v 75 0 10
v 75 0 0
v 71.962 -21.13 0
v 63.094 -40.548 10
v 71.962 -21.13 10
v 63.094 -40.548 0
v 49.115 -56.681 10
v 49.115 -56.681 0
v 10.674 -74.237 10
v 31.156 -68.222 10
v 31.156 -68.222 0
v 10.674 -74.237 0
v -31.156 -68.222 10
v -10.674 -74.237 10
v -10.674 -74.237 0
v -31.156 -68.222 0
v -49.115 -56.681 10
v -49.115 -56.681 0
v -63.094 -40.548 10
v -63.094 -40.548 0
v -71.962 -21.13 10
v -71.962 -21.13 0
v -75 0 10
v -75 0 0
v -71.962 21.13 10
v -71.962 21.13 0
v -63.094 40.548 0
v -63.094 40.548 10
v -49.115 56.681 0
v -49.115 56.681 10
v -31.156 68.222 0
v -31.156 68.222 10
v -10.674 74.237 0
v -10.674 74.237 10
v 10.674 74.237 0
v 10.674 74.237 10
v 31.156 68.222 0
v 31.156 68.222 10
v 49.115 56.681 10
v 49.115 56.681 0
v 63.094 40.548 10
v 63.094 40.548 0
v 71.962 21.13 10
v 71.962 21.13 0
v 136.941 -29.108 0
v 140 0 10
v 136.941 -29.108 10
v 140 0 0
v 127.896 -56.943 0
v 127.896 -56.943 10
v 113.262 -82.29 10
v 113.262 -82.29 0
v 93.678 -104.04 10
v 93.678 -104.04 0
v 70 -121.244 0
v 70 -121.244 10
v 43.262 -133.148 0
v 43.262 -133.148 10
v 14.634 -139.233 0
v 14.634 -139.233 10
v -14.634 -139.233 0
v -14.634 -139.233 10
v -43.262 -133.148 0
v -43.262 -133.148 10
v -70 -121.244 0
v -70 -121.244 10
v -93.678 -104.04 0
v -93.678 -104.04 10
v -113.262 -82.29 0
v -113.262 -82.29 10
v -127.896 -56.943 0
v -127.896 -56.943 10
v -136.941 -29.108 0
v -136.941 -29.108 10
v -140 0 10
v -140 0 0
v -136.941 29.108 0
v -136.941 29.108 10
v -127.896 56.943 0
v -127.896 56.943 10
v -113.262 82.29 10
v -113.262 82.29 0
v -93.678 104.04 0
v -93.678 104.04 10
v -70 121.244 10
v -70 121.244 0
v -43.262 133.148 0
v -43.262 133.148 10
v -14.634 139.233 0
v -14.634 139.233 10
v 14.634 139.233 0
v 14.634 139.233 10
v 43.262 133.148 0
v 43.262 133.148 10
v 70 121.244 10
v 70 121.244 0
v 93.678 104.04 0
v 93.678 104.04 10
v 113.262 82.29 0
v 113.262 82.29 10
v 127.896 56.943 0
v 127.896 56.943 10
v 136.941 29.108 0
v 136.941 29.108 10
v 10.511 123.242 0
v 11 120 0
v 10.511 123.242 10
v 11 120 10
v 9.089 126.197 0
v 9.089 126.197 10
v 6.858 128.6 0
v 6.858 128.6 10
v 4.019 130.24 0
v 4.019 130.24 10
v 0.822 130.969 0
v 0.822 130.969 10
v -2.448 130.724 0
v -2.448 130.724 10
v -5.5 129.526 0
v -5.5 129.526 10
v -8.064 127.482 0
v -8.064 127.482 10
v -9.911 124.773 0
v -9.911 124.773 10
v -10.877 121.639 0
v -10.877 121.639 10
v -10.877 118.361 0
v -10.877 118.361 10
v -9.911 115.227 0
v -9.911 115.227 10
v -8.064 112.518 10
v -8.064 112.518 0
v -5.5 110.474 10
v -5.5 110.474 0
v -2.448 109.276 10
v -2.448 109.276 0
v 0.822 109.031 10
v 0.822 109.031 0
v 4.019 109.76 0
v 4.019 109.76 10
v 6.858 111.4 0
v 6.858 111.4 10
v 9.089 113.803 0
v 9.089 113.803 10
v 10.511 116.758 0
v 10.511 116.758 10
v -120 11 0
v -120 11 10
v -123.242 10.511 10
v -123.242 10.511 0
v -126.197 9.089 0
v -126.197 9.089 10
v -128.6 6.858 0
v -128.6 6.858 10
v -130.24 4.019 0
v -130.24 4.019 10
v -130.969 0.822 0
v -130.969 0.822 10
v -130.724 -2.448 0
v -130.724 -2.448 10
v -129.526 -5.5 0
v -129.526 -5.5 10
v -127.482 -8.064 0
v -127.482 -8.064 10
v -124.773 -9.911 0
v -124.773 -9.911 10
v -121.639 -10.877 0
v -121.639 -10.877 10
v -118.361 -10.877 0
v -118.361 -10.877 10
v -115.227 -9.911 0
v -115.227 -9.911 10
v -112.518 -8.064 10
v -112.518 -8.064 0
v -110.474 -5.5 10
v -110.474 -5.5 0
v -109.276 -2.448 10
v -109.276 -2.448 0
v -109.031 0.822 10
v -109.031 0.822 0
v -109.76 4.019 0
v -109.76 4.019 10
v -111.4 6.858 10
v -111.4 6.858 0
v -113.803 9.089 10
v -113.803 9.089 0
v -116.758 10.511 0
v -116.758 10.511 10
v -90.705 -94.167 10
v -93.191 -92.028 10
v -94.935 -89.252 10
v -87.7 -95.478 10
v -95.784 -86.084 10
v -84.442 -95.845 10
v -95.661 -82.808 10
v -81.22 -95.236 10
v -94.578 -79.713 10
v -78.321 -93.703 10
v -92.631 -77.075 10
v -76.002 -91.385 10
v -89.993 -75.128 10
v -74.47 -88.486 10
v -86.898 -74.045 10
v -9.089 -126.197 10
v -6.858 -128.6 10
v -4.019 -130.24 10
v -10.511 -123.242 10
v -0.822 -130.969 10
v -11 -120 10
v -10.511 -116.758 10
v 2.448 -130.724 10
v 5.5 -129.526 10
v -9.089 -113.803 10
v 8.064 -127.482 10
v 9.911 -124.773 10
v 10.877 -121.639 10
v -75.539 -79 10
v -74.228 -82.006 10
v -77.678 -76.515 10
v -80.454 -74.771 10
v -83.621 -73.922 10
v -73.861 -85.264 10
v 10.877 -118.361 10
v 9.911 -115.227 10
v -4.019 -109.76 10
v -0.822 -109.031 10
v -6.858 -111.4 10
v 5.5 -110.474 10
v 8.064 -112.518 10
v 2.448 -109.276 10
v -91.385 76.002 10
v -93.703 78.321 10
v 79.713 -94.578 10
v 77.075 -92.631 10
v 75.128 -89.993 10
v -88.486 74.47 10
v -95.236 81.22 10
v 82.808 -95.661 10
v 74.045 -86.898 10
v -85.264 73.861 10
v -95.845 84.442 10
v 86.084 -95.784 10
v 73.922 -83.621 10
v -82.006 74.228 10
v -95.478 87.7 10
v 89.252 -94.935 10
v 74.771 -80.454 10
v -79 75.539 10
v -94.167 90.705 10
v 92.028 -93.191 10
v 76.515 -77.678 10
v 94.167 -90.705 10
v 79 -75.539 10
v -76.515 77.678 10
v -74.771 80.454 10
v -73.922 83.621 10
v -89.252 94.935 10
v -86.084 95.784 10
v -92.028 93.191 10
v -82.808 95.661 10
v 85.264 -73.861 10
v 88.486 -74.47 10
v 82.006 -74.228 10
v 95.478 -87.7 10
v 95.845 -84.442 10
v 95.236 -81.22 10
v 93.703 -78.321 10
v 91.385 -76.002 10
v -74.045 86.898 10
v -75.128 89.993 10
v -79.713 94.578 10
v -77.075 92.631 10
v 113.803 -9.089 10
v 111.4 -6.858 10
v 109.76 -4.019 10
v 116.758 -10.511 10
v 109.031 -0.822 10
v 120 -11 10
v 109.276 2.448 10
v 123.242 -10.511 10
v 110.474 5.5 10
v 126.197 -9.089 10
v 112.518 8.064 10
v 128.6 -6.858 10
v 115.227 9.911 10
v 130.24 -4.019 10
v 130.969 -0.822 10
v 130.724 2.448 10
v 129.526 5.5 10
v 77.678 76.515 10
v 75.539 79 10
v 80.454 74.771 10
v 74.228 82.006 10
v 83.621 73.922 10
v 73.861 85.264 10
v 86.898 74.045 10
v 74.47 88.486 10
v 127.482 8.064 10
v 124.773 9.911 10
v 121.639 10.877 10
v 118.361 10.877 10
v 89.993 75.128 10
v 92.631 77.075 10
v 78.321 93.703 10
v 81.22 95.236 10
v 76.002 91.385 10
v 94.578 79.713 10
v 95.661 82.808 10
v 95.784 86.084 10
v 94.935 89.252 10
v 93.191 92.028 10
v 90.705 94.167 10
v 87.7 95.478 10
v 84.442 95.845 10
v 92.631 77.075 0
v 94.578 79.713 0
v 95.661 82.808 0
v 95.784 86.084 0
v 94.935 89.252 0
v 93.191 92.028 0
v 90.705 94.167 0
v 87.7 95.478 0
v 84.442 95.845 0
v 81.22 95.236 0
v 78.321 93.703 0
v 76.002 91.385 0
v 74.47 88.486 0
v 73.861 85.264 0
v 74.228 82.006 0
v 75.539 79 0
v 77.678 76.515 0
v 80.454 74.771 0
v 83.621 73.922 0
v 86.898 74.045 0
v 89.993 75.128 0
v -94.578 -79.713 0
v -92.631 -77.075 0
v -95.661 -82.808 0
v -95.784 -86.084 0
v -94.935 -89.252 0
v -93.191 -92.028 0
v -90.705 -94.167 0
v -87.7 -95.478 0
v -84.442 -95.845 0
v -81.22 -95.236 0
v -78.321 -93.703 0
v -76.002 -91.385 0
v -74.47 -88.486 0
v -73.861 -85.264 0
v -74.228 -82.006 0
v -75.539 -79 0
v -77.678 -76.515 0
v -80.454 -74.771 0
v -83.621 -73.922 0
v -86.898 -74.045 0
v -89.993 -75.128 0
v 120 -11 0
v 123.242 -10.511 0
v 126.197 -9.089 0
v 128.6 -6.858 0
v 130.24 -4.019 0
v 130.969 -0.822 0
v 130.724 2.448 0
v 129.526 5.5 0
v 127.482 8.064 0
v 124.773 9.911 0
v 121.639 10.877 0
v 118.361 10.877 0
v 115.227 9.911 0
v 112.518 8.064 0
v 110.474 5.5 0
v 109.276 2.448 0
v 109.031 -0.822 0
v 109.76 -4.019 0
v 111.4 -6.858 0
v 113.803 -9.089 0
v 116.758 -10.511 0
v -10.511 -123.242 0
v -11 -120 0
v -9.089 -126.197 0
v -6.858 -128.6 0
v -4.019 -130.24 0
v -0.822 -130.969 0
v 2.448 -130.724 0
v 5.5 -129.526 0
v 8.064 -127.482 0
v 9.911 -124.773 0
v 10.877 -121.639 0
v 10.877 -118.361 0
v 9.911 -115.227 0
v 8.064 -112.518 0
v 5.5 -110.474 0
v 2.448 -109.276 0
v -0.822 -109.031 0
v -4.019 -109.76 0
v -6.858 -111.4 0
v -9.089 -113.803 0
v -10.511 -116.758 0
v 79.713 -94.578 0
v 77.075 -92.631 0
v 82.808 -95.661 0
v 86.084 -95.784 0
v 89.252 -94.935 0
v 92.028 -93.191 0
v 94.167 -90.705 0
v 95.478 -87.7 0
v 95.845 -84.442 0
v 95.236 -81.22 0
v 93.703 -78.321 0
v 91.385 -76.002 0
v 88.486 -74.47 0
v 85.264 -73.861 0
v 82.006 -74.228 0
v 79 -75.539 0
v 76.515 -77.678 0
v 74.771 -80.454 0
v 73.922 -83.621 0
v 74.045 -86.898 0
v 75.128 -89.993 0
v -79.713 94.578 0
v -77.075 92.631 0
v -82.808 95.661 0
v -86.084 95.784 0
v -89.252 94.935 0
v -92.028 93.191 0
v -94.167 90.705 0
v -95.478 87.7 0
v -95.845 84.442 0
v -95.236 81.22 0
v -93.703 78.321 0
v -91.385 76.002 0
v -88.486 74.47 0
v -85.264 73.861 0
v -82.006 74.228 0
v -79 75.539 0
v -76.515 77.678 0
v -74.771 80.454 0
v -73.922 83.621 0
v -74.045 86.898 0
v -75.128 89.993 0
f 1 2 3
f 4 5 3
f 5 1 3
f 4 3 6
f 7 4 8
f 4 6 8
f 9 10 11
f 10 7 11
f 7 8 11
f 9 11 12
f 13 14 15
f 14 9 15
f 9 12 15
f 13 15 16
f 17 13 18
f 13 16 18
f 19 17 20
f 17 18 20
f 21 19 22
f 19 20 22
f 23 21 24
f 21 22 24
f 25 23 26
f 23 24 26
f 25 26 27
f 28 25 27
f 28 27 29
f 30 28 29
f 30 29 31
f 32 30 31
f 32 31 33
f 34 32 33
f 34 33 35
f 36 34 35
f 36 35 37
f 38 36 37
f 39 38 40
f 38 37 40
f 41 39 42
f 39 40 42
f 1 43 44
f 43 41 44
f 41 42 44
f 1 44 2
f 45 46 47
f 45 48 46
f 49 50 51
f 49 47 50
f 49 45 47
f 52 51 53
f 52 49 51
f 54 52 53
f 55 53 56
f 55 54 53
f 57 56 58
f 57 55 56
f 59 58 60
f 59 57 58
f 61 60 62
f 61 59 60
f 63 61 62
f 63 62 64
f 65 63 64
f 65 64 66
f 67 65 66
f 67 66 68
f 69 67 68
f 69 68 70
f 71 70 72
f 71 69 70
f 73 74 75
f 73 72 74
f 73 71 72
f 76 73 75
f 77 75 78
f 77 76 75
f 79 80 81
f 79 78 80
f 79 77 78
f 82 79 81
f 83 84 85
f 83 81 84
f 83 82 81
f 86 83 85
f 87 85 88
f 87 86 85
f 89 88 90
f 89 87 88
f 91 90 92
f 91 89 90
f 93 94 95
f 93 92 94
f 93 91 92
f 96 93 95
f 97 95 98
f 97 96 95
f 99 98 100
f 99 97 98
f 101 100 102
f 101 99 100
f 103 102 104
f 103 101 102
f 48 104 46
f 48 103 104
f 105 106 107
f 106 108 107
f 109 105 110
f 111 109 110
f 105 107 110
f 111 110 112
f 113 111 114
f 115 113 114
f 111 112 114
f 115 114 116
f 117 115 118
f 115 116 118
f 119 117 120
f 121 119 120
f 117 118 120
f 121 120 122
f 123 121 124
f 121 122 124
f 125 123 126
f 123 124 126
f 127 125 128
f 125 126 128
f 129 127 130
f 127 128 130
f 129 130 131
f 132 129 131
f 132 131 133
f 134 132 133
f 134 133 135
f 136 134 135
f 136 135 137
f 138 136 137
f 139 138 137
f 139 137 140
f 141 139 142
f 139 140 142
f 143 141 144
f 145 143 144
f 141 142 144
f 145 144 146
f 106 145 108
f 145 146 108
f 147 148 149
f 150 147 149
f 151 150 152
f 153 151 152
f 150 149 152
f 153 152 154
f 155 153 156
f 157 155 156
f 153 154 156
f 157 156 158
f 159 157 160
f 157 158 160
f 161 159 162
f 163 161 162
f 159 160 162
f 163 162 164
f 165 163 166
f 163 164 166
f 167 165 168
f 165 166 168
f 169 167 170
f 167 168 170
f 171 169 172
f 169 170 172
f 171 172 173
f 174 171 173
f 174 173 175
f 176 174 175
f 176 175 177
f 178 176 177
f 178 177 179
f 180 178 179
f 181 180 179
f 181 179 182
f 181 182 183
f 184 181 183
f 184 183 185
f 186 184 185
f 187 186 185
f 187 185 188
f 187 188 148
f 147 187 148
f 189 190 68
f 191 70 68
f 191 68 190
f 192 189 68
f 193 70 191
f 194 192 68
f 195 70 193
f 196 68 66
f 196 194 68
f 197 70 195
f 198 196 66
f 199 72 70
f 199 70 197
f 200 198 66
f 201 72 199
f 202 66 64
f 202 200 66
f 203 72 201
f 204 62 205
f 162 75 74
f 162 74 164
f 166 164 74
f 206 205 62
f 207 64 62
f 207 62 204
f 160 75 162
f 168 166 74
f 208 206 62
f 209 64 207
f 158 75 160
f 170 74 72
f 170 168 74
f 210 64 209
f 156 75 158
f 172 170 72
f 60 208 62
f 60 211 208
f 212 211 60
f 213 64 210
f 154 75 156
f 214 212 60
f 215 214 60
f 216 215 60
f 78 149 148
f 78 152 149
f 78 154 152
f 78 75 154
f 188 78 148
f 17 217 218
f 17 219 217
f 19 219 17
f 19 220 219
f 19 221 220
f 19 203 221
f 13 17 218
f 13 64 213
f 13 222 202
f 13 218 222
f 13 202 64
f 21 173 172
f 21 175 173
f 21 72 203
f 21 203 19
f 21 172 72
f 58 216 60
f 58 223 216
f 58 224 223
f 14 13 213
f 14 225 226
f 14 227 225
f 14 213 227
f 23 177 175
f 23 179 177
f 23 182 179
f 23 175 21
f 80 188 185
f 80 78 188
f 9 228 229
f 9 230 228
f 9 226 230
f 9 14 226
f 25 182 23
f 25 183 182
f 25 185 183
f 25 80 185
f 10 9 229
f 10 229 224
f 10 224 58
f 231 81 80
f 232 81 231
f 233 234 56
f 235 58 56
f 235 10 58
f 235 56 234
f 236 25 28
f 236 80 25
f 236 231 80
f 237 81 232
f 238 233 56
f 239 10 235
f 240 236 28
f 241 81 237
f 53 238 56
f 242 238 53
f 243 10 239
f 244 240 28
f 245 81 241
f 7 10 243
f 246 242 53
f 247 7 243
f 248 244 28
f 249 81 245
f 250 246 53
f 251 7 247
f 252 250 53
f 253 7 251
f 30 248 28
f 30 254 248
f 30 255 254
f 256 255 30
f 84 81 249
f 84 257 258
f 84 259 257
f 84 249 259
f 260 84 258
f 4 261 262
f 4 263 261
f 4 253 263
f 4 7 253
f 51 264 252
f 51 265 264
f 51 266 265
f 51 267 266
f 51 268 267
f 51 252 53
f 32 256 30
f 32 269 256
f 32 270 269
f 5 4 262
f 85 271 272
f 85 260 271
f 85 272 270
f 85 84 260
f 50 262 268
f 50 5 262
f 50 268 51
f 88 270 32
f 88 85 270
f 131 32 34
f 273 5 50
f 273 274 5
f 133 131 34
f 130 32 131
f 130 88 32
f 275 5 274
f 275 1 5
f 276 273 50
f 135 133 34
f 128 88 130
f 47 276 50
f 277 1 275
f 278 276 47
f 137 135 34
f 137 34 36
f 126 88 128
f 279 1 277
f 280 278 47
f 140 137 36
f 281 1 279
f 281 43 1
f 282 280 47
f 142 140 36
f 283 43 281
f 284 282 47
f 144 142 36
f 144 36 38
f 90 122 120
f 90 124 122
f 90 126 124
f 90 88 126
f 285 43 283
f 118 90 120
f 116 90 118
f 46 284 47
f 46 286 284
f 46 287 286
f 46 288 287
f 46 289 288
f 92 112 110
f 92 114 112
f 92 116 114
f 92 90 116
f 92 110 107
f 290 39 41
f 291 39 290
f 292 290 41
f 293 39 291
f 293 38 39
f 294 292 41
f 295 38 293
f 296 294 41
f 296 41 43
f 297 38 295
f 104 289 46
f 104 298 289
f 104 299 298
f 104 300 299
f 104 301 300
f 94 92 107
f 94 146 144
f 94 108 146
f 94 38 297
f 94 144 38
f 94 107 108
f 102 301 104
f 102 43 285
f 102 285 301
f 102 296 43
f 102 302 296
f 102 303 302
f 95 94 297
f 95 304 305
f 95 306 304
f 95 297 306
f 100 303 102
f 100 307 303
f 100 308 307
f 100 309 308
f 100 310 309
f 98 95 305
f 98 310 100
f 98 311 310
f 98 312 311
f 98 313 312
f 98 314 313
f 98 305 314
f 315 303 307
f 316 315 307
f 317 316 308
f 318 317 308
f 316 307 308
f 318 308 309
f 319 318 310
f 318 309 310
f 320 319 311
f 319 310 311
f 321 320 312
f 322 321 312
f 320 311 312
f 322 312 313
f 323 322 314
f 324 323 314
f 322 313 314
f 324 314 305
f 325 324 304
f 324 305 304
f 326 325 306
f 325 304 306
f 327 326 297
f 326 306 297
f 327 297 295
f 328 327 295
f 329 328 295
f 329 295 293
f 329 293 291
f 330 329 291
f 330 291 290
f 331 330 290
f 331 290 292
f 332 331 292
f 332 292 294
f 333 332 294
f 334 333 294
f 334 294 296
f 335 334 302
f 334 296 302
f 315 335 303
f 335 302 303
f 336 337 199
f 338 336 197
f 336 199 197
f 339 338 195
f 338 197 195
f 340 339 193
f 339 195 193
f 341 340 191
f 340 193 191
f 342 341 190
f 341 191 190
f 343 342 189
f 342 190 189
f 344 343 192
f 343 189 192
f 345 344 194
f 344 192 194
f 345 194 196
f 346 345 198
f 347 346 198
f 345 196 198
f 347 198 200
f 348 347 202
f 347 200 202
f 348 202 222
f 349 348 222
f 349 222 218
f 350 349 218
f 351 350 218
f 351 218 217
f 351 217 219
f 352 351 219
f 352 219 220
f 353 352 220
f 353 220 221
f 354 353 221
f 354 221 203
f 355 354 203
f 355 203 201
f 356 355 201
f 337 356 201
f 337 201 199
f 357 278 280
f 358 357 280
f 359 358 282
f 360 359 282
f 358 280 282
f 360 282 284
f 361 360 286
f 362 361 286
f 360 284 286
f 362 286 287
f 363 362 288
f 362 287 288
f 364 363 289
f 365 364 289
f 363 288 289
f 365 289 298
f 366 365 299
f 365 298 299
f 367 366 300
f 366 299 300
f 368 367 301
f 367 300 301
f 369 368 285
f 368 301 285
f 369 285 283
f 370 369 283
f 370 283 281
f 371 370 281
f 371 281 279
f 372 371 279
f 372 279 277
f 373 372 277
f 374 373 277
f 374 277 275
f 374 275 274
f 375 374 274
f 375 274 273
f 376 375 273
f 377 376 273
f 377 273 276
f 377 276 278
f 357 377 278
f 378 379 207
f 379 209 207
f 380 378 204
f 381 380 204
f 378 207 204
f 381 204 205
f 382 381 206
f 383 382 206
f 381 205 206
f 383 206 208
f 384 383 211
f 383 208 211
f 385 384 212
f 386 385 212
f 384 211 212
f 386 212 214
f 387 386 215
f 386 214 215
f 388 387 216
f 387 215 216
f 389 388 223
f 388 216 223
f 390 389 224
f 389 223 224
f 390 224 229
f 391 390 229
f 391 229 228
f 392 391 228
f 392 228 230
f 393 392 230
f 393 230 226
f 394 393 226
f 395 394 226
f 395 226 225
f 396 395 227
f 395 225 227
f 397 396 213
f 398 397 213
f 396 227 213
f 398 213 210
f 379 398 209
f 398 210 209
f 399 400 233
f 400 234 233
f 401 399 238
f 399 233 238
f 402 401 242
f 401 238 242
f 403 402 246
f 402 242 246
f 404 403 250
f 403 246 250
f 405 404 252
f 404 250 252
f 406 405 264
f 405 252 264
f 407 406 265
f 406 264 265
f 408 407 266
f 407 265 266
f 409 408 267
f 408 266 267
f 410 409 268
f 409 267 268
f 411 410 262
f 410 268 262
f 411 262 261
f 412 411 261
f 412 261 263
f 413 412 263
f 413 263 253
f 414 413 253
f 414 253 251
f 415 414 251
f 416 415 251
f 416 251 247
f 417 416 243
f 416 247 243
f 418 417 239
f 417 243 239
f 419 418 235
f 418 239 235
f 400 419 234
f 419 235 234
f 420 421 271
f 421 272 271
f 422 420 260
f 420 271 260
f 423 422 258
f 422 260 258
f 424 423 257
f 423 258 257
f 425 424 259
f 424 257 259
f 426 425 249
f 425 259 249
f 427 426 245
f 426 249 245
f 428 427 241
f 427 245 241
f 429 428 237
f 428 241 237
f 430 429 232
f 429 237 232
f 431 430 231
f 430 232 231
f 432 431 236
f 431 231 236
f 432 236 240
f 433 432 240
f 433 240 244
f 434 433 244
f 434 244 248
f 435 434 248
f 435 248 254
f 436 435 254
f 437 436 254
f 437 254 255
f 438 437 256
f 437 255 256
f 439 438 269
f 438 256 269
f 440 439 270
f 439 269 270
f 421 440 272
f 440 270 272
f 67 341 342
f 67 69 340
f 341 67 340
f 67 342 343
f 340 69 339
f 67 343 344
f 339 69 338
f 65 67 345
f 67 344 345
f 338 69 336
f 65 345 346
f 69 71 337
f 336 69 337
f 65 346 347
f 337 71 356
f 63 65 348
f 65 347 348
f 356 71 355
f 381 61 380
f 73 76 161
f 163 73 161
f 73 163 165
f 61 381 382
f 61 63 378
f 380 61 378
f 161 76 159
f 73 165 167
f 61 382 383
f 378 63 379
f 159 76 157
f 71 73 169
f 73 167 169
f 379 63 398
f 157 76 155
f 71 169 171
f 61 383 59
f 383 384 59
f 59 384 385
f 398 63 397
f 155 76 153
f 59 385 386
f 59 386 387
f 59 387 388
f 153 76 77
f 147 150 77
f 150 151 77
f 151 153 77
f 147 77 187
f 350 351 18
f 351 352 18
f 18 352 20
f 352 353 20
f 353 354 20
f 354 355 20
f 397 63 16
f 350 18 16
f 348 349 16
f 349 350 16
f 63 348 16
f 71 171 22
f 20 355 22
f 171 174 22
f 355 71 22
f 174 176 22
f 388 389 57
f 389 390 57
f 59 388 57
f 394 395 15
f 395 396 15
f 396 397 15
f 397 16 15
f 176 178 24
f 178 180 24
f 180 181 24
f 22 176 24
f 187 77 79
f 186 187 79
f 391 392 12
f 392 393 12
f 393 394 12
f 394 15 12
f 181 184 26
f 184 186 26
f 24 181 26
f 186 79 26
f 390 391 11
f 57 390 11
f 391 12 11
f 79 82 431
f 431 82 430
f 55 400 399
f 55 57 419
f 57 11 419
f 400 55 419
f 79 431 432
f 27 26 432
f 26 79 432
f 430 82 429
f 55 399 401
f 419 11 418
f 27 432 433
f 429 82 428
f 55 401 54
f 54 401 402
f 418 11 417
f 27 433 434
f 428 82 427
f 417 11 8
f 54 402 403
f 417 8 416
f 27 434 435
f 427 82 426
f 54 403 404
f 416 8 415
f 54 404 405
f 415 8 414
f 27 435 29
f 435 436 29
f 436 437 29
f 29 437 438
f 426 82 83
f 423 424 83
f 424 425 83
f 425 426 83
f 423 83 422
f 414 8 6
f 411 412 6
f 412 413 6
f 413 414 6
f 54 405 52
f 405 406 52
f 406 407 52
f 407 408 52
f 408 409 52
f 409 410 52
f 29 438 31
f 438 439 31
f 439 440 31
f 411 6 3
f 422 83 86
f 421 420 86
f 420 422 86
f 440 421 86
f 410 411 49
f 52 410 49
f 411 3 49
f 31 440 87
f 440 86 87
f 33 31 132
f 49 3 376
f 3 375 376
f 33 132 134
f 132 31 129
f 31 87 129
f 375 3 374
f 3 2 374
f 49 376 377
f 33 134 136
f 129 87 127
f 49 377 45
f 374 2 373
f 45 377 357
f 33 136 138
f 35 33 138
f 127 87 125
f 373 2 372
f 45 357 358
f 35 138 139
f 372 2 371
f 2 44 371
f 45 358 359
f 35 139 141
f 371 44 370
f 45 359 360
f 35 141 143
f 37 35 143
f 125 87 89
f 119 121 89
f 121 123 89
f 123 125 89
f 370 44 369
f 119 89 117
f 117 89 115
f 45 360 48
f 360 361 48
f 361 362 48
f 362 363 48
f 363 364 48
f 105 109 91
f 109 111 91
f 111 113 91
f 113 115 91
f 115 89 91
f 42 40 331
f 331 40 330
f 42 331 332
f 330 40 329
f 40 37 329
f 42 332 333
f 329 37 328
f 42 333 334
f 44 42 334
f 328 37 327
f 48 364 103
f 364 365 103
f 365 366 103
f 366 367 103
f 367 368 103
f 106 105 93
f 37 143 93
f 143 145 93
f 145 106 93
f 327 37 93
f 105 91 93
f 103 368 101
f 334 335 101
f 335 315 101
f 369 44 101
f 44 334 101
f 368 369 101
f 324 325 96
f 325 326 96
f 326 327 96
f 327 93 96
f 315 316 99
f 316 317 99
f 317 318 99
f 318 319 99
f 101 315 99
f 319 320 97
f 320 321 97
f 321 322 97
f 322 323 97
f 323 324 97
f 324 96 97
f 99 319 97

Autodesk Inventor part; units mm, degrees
ref_plane "YZ Plane" through (0, 0, 0) normal (1, 0, 0) x (0, 1, 0)
ref_plane "XZ Plane" through (0, 0, 0) normal (0, 1, 0) x (-1, 0, 0)
ref_plane "XY Plane" through (0, 0, 0) normal (0, 0, 1) x (1, 0, 0)
sketch "Sketch1" plane through (0, 0, 0) normal (0, 0, 1) x (1, 0, 0)
  circle A0 centre (0, 0) radius 75
  circle A1 centre (0, 0) radius 140
  dimension "d22" = 150
  dimension "d23" = 280
extrude "Plate1" add sketch "Sketch1" along normal blind 10
sketch "Sketch5" plane through (0, 0, 10) normal (0, 0, 1) x (1, 0, 0)
  circle A0 centre (0, 120) radius 11
  circle A1 centre (0, 0) radius 120 construction
  dimension "d25" = 240
  dimension "d24" = 22
extrude "Cut1" cut sketch "Sketch5" against normal blind 10
pattern_circular "Circular Pattern1" count 8 over 360 about axis through (0, 0, 0) along (0, 0, 1) of "Cut1"
equation "\"d26\" = Thickness"
equation "\"d2\" = Thickness"
equation "\"BendReliefDepth\" = 0.5 * Thickness"
equation "\"TransitionRadius\" = BendRadius"
equation "\"JacobiRadiusSize\" = BendRadius"
equation "\"Thickness\" = 10"
equation "\"BendRadius\" = 5"
properties part number "Main filter Flange" material "Stainless Steel"
